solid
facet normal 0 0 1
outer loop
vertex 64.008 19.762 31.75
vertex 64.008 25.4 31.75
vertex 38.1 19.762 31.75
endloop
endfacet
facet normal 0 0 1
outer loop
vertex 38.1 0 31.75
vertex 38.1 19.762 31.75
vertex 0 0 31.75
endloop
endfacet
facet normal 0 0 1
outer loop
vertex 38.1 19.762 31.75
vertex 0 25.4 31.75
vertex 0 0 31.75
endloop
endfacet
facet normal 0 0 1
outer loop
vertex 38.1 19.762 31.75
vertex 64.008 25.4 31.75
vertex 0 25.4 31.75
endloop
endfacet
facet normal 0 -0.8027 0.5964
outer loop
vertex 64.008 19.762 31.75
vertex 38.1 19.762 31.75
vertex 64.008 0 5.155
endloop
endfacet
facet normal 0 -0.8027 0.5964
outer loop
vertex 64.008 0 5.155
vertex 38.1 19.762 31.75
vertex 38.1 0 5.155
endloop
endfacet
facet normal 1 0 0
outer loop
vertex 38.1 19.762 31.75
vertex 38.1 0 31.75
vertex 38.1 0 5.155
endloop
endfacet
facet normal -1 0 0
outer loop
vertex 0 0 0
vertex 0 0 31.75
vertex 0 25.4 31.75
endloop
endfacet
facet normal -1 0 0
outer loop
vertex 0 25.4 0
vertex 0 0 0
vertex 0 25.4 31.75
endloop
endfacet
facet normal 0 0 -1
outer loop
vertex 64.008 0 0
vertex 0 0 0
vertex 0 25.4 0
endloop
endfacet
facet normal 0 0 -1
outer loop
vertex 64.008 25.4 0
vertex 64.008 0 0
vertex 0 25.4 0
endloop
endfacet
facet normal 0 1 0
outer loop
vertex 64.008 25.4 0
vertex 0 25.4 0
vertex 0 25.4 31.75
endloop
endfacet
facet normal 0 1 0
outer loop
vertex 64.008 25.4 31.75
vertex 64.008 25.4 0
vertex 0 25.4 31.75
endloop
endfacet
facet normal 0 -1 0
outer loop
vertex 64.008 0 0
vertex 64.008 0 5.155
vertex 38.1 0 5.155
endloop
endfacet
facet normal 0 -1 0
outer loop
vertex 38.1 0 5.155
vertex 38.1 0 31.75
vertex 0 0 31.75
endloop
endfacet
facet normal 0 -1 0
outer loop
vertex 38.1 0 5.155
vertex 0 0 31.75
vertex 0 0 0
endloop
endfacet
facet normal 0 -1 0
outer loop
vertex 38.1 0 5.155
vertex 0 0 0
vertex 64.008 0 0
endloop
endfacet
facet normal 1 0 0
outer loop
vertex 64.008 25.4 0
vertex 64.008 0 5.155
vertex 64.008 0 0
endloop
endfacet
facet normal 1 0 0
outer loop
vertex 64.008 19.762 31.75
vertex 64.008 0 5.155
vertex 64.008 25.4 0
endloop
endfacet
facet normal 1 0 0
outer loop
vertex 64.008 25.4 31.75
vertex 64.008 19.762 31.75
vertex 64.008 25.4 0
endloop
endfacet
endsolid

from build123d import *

# Parameters (mm, degrees)
F0_W     = 25.4
F0_H     = 31.75
F1_DEPTH = 38.1
F3_DEPTH = 25.908


with BuildPart() as f1:
    # F0 (on Right) → F1 (new body)
    with BuildSketch(Plane.YZ):
        with Locations((12.7, 15.875)):
            Rectangle(F0_W, F0_H)
    extrude(amount=F1_DEPTH)

    # F2 (on face) → F3 (join)
    with BuildSketch(Plane.YZ.offset(38.1)):
        Polygon((25.4, 31.75), (19.762445, 31.75), (0, 5.154566), (0, 0), (25.4, 0), align=None)
    extrude(amount=F3_DEPTH)


solid = f1.part
